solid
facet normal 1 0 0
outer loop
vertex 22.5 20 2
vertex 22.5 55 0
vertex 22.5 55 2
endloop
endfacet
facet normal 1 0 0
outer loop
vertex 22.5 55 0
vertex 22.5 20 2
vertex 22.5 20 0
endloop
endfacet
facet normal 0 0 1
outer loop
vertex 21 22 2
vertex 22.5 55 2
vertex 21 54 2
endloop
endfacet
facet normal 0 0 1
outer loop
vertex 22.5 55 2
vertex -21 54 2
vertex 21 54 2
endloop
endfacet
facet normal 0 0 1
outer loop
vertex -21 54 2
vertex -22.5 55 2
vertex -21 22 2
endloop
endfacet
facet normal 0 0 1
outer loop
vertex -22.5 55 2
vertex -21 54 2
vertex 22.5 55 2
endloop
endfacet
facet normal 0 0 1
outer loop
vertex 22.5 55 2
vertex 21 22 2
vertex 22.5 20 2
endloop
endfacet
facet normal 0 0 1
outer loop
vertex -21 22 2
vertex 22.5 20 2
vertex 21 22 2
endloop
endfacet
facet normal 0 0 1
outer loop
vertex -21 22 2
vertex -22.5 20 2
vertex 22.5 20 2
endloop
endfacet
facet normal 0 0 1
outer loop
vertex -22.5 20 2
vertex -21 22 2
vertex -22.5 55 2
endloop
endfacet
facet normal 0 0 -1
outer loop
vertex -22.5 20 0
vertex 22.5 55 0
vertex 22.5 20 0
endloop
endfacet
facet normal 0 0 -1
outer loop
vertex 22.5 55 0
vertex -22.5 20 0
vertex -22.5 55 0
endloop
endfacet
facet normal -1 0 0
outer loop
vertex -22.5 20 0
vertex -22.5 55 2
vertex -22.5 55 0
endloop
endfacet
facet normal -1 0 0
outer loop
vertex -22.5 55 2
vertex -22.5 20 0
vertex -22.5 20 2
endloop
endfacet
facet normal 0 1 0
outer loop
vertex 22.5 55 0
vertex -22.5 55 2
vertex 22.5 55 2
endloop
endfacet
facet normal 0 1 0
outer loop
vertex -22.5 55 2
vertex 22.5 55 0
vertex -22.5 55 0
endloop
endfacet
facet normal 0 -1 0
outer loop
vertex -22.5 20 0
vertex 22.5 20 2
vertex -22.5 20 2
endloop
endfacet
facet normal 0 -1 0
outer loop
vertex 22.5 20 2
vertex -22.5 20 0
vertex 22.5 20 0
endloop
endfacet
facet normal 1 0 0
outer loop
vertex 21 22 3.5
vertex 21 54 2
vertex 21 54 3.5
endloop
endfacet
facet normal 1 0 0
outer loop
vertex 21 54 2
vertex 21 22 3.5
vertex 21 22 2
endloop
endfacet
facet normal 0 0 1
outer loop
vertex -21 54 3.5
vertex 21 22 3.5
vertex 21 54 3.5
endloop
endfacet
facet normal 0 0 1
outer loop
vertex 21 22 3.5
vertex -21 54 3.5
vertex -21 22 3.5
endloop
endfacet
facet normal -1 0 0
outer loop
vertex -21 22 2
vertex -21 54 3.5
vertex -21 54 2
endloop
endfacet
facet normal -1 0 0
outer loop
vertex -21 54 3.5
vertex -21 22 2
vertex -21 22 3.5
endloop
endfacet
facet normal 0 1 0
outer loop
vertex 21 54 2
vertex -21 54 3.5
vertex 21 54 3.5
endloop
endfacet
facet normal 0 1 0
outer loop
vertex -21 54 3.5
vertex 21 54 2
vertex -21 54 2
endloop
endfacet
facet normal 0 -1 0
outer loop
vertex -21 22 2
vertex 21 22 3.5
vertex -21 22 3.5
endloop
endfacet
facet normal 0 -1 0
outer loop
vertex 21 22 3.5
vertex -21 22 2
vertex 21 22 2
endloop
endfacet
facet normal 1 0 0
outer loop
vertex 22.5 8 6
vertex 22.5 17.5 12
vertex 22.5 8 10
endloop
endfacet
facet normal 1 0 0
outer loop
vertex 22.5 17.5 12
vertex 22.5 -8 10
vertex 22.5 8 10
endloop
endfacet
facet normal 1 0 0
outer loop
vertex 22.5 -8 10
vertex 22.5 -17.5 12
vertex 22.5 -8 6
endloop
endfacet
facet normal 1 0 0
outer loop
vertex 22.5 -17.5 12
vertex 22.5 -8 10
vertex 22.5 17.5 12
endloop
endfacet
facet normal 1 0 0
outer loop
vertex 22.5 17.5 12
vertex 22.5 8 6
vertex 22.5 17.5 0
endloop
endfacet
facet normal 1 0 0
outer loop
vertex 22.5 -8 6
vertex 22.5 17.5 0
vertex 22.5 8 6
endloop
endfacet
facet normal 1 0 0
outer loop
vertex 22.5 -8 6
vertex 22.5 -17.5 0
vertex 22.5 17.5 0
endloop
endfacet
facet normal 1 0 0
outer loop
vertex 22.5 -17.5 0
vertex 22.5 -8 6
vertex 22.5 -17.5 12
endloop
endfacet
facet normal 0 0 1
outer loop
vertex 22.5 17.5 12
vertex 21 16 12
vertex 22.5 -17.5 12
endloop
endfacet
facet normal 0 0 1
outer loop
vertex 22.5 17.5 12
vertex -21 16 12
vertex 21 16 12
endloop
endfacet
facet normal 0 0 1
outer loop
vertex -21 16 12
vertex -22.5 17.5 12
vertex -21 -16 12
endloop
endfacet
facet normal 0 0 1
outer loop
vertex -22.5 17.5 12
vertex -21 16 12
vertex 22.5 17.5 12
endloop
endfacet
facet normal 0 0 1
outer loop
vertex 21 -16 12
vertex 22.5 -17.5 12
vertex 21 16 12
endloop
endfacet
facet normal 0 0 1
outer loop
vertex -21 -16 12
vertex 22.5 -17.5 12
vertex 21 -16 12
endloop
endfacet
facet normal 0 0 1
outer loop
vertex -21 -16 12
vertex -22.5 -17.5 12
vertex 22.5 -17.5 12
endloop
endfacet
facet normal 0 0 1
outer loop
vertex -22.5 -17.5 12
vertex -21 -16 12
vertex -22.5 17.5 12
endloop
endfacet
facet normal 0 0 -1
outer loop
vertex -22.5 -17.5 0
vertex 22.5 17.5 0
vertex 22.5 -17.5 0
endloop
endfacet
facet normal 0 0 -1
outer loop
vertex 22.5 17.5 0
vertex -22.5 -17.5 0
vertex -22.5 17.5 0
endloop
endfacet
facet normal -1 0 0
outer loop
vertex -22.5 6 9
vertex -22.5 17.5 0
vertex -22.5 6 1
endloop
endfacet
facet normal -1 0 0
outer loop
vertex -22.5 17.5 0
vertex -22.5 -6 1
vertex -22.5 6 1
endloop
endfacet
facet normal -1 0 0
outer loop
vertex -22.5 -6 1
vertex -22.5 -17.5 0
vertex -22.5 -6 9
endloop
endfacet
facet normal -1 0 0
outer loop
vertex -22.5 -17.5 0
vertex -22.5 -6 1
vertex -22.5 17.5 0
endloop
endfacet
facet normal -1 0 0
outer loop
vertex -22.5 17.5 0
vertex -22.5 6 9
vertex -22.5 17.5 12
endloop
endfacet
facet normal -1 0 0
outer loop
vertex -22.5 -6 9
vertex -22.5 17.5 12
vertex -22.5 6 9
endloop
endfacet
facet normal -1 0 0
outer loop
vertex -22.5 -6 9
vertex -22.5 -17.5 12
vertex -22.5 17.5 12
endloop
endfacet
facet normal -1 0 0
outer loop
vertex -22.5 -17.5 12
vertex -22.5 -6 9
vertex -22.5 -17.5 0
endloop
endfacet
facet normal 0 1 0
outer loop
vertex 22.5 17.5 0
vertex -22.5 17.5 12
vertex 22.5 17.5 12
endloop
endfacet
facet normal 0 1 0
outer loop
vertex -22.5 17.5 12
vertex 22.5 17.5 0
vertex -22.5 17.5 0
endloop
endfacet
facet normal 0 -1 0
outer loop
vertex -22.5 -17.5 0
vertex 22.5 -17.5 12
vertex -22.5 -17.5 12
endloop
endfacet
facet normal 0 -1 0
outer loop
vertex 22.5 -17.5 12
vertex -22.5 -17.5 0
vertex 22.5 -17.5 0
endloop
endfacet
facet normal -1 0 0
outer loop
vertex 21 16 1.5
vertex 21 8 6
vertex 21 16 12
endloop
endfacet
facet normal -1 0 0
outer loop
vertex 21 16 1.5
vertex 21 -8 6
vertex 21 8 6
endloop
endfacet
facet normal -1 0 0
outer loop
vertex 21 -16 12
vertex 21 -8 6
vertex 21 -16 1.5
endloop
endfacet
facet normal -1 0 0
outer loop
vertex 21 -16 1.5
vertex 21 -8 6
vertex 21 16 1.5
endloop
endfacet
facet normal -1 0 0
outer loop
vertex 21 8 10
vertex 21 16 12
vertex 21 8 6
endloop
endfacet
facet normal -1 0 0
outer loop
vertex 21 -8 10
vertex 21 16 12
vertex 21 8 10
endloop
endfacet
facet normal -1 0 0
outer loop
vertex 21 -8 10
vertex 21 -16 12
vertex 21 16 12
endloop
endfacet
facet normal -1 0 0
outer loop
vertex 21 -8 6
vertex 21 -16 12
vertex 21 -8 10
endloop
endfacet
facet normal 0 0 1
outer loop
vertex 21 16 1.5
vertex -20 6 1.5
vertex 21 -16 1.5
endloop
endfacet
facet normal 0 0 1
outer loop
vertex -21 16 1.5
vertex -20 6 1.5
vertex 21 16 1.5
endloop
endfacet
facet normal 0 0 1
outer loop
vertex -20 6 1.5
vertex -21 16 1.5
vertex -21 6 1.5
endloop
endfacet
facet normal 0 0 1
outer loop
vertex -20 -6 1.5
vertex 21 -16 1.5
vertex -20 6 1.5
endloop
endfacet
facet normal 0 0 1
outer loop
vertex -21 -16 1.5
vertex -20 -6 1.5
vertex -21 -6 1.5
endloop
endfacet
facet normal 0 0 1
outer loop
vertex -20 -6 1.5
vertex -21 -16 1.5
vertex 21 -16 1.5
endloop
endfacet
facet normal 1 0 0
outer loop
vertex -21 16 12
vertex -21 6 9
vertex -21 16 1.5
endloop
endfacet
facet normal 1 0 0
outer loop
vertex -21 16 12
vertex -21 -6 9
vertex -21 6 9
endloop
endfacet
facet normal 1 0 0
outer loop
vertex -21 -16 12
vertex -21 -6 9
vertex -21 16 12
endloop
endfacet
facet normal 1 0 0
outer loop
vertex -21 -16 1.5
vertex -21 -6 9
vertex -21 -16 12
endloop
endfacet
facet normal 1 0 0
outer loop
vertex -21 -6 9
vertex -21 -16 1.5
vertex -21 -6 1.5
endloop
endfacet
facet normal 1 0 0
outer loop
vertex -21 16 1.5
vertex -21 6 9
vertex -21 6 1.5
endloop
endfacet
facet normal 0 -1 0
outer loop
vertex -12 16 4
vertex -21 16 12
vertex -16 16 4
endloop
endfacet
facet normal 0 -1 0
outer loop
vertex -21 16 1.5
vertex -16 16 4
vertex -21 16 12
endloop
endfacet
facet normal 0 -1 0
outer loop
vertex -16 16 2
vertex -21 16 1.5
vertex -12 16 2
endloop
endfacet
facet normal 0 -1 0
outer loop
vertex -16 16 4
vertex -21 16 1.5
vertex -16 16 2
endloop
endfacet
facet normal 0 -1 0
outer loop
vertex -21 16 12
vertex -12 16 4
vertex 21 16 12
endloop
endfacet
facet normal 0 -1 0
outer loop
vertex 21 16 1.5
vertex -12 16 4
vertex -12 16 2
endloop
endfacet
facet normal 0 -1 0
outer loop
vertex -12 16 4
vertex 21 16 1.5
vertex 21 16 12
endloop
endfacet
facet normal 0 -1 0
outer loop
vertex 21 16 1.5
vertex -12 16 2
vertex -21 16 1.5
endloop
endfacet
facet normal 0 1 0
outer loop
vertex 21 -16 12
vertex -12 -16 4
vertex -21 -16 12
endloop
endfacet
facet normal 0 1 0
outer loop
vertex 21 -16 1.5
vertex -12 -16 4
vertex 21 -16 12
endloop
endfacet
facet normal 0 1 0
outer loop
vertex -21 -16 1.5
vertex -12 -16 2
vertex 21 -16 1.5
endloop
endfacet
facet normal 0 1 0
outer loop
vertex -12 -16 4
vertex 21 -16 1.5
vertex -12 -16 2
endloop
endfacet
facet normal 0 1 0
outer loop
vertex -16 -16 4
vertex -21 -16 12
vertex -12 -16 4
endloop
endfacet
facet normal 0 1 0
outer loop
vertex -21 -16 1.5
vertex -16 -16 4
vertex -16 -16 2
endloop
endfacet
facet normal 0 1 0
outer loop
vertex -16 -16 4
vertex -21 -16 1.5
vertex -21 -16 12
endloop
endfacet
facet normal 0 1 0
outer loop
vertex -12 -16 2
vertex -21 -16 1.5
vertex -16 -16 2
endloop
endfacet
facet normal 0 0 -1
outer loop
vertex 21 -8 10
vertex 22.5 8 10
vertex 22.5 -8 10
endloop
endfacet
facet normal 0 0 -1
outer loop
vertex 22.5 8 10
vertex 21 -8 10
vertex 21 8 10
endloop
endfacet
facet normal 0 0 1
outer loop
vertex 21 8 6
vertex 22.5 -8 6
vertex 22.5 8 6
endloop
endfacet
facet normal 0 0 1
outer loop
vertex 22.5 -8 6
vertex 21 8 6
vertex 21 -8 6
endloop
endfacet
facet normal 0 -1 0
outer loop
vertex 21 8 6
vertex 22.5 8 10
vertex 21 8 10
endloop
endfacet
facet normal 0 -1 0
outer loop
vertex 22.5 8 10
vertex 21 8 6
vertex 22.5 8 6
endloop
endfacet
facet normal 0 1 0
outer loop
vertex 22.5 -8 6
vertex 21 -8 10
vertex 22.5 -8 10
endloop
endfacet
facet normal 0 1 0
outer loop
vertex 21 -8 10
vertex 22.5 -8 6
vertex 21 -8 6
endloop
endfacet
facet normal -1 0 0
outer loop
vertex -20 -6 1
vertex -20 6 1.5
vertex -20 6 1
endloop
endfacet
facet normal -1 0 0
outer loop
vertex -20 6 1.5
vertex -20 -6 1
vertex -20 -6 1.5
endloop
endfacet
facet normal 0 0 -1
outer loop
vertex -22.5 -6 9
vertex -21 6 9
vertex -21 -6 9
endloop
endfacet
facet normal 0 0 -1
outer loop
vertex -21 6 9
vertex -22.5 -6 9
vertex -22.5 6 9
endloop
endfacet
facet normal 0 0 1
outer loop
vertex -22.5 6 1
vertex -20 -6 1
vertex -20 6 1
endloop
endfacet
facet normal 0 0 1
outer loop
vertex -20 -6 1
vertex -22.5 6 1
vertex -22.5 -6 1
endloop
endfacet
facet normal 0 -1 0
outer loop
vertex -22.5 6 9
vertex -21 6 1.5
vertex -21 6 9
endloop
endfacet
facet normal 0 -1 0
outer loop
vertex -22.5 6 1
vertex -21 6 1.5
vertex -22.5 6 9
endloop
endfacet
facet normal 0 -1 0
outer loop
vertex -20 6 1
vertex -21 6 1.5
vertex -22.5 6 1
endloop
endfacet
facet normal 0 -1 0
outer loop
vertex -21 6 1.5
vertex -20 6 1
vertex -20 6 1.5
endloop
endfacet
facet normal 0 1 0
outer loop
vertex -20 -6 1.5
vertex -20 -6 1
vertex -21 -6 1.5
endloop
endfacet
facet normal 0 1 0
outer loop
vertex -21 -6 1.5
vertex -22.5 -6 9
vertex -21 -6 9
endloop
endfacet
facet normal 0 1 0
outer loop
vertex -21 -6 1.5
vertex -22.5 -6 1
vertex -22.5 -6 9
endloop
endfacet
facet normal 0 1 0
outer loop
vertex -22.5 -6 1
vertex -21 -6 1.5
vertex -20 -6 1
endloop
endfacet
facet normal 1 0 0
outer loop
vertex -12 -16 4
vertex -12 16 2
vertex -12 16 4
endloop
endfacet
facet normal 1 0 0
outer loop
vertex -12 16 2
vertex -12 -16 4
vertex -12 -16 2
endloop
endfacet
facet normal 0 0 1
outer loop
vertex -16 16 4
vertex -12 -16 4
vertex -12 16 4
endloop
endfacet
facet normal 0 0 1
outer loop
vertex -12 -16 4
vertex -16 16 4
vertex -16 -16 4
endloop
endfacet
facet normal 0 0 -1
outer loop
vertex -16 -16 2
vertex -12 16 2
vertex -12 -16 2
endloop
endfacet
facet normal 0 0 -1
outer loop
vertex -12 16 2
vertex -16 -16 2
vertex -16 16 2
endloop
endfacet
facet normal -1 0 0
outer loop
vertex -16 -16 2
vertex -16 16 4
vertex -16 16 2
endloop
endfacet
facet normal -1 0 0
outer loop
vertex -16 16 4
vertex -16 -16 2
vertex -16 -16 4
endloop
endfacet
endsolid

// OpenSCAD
height = 12.0;

thickness = 1.5; // Wemos 2.0
fudge = 0.1;

/* Wemos
width = 38.5;
depth = 30.50;
*/

width = 45;
depth = 35;

cavity_width = width - (2 * thickness);
cavity_depth = depth - (2 * thickness);
cavity_height = height - thickness + fudge;

hole_diameter = 7.0;

slit_width = 4.0;
slit_height = 23.0;

// lid
difference() {
    union () {
        translate([-(width / 2.0), 20, 0.0]) cube([width, depth, 2.0]);
        translate([-(cavity_width / 2.0), 22, 2.0]) cube([cavity_width, cavity_depth, 1.5]);            
    }
    //translate([1, 22 + (cavity_depth / 2), 2.5]) cylinder(h = 5 + fudge, r1 = hole_diameter, r2 =hole_diameter, center = true);
    //rotate([0, 0, 90]) translate([21.9, -12.5, 0]) cube([slit_width, slit_height, 10]);
    //rotate([0, 0, 90]) translate([44.6, -12.5, 0]) cube([slit_width, slit_height, 10]);
}

// base
union() {
    //translate([13.5, -(cavity_depth / 2.0), 2]) cube([4.0, cavity_depth, 4.0]);
    translate([-16, -(cavity_depth / 2.0), 2]) cube([4.0, cavity_depth, 2.0]);
    difference () {
        translate([0, 0, height / 2.0]) cube([width, depth, height], center = true); 
        translate([0, 0, (cavity_height / 2.0) + thickness]) cube([cavity_width, cavity_depth, cavity_height], center = true);
        //translate([1, 0, thickness / 2.0]) cylinder(h = thickness + fudge, r1 = hole_diameter, r2 = hole_diameter, center = true);
        //rotate([0, 0, 90]) translate([9, -12.5, 0]) cube([slit_width, slit_height, 5]);
        //rotate([0, 0, 90]) translate([-13, -12.5, 0]) cube([slit_width, slit_height, 5]);
        translate([10, -8, 6]) cube([30, 16, 4]);
        translate([-23, -6, 1]) cube([3, 12, 8]);
        translate([-17.25, 13.0, 4]) cube([7, 3, 4]);        
    }
}
